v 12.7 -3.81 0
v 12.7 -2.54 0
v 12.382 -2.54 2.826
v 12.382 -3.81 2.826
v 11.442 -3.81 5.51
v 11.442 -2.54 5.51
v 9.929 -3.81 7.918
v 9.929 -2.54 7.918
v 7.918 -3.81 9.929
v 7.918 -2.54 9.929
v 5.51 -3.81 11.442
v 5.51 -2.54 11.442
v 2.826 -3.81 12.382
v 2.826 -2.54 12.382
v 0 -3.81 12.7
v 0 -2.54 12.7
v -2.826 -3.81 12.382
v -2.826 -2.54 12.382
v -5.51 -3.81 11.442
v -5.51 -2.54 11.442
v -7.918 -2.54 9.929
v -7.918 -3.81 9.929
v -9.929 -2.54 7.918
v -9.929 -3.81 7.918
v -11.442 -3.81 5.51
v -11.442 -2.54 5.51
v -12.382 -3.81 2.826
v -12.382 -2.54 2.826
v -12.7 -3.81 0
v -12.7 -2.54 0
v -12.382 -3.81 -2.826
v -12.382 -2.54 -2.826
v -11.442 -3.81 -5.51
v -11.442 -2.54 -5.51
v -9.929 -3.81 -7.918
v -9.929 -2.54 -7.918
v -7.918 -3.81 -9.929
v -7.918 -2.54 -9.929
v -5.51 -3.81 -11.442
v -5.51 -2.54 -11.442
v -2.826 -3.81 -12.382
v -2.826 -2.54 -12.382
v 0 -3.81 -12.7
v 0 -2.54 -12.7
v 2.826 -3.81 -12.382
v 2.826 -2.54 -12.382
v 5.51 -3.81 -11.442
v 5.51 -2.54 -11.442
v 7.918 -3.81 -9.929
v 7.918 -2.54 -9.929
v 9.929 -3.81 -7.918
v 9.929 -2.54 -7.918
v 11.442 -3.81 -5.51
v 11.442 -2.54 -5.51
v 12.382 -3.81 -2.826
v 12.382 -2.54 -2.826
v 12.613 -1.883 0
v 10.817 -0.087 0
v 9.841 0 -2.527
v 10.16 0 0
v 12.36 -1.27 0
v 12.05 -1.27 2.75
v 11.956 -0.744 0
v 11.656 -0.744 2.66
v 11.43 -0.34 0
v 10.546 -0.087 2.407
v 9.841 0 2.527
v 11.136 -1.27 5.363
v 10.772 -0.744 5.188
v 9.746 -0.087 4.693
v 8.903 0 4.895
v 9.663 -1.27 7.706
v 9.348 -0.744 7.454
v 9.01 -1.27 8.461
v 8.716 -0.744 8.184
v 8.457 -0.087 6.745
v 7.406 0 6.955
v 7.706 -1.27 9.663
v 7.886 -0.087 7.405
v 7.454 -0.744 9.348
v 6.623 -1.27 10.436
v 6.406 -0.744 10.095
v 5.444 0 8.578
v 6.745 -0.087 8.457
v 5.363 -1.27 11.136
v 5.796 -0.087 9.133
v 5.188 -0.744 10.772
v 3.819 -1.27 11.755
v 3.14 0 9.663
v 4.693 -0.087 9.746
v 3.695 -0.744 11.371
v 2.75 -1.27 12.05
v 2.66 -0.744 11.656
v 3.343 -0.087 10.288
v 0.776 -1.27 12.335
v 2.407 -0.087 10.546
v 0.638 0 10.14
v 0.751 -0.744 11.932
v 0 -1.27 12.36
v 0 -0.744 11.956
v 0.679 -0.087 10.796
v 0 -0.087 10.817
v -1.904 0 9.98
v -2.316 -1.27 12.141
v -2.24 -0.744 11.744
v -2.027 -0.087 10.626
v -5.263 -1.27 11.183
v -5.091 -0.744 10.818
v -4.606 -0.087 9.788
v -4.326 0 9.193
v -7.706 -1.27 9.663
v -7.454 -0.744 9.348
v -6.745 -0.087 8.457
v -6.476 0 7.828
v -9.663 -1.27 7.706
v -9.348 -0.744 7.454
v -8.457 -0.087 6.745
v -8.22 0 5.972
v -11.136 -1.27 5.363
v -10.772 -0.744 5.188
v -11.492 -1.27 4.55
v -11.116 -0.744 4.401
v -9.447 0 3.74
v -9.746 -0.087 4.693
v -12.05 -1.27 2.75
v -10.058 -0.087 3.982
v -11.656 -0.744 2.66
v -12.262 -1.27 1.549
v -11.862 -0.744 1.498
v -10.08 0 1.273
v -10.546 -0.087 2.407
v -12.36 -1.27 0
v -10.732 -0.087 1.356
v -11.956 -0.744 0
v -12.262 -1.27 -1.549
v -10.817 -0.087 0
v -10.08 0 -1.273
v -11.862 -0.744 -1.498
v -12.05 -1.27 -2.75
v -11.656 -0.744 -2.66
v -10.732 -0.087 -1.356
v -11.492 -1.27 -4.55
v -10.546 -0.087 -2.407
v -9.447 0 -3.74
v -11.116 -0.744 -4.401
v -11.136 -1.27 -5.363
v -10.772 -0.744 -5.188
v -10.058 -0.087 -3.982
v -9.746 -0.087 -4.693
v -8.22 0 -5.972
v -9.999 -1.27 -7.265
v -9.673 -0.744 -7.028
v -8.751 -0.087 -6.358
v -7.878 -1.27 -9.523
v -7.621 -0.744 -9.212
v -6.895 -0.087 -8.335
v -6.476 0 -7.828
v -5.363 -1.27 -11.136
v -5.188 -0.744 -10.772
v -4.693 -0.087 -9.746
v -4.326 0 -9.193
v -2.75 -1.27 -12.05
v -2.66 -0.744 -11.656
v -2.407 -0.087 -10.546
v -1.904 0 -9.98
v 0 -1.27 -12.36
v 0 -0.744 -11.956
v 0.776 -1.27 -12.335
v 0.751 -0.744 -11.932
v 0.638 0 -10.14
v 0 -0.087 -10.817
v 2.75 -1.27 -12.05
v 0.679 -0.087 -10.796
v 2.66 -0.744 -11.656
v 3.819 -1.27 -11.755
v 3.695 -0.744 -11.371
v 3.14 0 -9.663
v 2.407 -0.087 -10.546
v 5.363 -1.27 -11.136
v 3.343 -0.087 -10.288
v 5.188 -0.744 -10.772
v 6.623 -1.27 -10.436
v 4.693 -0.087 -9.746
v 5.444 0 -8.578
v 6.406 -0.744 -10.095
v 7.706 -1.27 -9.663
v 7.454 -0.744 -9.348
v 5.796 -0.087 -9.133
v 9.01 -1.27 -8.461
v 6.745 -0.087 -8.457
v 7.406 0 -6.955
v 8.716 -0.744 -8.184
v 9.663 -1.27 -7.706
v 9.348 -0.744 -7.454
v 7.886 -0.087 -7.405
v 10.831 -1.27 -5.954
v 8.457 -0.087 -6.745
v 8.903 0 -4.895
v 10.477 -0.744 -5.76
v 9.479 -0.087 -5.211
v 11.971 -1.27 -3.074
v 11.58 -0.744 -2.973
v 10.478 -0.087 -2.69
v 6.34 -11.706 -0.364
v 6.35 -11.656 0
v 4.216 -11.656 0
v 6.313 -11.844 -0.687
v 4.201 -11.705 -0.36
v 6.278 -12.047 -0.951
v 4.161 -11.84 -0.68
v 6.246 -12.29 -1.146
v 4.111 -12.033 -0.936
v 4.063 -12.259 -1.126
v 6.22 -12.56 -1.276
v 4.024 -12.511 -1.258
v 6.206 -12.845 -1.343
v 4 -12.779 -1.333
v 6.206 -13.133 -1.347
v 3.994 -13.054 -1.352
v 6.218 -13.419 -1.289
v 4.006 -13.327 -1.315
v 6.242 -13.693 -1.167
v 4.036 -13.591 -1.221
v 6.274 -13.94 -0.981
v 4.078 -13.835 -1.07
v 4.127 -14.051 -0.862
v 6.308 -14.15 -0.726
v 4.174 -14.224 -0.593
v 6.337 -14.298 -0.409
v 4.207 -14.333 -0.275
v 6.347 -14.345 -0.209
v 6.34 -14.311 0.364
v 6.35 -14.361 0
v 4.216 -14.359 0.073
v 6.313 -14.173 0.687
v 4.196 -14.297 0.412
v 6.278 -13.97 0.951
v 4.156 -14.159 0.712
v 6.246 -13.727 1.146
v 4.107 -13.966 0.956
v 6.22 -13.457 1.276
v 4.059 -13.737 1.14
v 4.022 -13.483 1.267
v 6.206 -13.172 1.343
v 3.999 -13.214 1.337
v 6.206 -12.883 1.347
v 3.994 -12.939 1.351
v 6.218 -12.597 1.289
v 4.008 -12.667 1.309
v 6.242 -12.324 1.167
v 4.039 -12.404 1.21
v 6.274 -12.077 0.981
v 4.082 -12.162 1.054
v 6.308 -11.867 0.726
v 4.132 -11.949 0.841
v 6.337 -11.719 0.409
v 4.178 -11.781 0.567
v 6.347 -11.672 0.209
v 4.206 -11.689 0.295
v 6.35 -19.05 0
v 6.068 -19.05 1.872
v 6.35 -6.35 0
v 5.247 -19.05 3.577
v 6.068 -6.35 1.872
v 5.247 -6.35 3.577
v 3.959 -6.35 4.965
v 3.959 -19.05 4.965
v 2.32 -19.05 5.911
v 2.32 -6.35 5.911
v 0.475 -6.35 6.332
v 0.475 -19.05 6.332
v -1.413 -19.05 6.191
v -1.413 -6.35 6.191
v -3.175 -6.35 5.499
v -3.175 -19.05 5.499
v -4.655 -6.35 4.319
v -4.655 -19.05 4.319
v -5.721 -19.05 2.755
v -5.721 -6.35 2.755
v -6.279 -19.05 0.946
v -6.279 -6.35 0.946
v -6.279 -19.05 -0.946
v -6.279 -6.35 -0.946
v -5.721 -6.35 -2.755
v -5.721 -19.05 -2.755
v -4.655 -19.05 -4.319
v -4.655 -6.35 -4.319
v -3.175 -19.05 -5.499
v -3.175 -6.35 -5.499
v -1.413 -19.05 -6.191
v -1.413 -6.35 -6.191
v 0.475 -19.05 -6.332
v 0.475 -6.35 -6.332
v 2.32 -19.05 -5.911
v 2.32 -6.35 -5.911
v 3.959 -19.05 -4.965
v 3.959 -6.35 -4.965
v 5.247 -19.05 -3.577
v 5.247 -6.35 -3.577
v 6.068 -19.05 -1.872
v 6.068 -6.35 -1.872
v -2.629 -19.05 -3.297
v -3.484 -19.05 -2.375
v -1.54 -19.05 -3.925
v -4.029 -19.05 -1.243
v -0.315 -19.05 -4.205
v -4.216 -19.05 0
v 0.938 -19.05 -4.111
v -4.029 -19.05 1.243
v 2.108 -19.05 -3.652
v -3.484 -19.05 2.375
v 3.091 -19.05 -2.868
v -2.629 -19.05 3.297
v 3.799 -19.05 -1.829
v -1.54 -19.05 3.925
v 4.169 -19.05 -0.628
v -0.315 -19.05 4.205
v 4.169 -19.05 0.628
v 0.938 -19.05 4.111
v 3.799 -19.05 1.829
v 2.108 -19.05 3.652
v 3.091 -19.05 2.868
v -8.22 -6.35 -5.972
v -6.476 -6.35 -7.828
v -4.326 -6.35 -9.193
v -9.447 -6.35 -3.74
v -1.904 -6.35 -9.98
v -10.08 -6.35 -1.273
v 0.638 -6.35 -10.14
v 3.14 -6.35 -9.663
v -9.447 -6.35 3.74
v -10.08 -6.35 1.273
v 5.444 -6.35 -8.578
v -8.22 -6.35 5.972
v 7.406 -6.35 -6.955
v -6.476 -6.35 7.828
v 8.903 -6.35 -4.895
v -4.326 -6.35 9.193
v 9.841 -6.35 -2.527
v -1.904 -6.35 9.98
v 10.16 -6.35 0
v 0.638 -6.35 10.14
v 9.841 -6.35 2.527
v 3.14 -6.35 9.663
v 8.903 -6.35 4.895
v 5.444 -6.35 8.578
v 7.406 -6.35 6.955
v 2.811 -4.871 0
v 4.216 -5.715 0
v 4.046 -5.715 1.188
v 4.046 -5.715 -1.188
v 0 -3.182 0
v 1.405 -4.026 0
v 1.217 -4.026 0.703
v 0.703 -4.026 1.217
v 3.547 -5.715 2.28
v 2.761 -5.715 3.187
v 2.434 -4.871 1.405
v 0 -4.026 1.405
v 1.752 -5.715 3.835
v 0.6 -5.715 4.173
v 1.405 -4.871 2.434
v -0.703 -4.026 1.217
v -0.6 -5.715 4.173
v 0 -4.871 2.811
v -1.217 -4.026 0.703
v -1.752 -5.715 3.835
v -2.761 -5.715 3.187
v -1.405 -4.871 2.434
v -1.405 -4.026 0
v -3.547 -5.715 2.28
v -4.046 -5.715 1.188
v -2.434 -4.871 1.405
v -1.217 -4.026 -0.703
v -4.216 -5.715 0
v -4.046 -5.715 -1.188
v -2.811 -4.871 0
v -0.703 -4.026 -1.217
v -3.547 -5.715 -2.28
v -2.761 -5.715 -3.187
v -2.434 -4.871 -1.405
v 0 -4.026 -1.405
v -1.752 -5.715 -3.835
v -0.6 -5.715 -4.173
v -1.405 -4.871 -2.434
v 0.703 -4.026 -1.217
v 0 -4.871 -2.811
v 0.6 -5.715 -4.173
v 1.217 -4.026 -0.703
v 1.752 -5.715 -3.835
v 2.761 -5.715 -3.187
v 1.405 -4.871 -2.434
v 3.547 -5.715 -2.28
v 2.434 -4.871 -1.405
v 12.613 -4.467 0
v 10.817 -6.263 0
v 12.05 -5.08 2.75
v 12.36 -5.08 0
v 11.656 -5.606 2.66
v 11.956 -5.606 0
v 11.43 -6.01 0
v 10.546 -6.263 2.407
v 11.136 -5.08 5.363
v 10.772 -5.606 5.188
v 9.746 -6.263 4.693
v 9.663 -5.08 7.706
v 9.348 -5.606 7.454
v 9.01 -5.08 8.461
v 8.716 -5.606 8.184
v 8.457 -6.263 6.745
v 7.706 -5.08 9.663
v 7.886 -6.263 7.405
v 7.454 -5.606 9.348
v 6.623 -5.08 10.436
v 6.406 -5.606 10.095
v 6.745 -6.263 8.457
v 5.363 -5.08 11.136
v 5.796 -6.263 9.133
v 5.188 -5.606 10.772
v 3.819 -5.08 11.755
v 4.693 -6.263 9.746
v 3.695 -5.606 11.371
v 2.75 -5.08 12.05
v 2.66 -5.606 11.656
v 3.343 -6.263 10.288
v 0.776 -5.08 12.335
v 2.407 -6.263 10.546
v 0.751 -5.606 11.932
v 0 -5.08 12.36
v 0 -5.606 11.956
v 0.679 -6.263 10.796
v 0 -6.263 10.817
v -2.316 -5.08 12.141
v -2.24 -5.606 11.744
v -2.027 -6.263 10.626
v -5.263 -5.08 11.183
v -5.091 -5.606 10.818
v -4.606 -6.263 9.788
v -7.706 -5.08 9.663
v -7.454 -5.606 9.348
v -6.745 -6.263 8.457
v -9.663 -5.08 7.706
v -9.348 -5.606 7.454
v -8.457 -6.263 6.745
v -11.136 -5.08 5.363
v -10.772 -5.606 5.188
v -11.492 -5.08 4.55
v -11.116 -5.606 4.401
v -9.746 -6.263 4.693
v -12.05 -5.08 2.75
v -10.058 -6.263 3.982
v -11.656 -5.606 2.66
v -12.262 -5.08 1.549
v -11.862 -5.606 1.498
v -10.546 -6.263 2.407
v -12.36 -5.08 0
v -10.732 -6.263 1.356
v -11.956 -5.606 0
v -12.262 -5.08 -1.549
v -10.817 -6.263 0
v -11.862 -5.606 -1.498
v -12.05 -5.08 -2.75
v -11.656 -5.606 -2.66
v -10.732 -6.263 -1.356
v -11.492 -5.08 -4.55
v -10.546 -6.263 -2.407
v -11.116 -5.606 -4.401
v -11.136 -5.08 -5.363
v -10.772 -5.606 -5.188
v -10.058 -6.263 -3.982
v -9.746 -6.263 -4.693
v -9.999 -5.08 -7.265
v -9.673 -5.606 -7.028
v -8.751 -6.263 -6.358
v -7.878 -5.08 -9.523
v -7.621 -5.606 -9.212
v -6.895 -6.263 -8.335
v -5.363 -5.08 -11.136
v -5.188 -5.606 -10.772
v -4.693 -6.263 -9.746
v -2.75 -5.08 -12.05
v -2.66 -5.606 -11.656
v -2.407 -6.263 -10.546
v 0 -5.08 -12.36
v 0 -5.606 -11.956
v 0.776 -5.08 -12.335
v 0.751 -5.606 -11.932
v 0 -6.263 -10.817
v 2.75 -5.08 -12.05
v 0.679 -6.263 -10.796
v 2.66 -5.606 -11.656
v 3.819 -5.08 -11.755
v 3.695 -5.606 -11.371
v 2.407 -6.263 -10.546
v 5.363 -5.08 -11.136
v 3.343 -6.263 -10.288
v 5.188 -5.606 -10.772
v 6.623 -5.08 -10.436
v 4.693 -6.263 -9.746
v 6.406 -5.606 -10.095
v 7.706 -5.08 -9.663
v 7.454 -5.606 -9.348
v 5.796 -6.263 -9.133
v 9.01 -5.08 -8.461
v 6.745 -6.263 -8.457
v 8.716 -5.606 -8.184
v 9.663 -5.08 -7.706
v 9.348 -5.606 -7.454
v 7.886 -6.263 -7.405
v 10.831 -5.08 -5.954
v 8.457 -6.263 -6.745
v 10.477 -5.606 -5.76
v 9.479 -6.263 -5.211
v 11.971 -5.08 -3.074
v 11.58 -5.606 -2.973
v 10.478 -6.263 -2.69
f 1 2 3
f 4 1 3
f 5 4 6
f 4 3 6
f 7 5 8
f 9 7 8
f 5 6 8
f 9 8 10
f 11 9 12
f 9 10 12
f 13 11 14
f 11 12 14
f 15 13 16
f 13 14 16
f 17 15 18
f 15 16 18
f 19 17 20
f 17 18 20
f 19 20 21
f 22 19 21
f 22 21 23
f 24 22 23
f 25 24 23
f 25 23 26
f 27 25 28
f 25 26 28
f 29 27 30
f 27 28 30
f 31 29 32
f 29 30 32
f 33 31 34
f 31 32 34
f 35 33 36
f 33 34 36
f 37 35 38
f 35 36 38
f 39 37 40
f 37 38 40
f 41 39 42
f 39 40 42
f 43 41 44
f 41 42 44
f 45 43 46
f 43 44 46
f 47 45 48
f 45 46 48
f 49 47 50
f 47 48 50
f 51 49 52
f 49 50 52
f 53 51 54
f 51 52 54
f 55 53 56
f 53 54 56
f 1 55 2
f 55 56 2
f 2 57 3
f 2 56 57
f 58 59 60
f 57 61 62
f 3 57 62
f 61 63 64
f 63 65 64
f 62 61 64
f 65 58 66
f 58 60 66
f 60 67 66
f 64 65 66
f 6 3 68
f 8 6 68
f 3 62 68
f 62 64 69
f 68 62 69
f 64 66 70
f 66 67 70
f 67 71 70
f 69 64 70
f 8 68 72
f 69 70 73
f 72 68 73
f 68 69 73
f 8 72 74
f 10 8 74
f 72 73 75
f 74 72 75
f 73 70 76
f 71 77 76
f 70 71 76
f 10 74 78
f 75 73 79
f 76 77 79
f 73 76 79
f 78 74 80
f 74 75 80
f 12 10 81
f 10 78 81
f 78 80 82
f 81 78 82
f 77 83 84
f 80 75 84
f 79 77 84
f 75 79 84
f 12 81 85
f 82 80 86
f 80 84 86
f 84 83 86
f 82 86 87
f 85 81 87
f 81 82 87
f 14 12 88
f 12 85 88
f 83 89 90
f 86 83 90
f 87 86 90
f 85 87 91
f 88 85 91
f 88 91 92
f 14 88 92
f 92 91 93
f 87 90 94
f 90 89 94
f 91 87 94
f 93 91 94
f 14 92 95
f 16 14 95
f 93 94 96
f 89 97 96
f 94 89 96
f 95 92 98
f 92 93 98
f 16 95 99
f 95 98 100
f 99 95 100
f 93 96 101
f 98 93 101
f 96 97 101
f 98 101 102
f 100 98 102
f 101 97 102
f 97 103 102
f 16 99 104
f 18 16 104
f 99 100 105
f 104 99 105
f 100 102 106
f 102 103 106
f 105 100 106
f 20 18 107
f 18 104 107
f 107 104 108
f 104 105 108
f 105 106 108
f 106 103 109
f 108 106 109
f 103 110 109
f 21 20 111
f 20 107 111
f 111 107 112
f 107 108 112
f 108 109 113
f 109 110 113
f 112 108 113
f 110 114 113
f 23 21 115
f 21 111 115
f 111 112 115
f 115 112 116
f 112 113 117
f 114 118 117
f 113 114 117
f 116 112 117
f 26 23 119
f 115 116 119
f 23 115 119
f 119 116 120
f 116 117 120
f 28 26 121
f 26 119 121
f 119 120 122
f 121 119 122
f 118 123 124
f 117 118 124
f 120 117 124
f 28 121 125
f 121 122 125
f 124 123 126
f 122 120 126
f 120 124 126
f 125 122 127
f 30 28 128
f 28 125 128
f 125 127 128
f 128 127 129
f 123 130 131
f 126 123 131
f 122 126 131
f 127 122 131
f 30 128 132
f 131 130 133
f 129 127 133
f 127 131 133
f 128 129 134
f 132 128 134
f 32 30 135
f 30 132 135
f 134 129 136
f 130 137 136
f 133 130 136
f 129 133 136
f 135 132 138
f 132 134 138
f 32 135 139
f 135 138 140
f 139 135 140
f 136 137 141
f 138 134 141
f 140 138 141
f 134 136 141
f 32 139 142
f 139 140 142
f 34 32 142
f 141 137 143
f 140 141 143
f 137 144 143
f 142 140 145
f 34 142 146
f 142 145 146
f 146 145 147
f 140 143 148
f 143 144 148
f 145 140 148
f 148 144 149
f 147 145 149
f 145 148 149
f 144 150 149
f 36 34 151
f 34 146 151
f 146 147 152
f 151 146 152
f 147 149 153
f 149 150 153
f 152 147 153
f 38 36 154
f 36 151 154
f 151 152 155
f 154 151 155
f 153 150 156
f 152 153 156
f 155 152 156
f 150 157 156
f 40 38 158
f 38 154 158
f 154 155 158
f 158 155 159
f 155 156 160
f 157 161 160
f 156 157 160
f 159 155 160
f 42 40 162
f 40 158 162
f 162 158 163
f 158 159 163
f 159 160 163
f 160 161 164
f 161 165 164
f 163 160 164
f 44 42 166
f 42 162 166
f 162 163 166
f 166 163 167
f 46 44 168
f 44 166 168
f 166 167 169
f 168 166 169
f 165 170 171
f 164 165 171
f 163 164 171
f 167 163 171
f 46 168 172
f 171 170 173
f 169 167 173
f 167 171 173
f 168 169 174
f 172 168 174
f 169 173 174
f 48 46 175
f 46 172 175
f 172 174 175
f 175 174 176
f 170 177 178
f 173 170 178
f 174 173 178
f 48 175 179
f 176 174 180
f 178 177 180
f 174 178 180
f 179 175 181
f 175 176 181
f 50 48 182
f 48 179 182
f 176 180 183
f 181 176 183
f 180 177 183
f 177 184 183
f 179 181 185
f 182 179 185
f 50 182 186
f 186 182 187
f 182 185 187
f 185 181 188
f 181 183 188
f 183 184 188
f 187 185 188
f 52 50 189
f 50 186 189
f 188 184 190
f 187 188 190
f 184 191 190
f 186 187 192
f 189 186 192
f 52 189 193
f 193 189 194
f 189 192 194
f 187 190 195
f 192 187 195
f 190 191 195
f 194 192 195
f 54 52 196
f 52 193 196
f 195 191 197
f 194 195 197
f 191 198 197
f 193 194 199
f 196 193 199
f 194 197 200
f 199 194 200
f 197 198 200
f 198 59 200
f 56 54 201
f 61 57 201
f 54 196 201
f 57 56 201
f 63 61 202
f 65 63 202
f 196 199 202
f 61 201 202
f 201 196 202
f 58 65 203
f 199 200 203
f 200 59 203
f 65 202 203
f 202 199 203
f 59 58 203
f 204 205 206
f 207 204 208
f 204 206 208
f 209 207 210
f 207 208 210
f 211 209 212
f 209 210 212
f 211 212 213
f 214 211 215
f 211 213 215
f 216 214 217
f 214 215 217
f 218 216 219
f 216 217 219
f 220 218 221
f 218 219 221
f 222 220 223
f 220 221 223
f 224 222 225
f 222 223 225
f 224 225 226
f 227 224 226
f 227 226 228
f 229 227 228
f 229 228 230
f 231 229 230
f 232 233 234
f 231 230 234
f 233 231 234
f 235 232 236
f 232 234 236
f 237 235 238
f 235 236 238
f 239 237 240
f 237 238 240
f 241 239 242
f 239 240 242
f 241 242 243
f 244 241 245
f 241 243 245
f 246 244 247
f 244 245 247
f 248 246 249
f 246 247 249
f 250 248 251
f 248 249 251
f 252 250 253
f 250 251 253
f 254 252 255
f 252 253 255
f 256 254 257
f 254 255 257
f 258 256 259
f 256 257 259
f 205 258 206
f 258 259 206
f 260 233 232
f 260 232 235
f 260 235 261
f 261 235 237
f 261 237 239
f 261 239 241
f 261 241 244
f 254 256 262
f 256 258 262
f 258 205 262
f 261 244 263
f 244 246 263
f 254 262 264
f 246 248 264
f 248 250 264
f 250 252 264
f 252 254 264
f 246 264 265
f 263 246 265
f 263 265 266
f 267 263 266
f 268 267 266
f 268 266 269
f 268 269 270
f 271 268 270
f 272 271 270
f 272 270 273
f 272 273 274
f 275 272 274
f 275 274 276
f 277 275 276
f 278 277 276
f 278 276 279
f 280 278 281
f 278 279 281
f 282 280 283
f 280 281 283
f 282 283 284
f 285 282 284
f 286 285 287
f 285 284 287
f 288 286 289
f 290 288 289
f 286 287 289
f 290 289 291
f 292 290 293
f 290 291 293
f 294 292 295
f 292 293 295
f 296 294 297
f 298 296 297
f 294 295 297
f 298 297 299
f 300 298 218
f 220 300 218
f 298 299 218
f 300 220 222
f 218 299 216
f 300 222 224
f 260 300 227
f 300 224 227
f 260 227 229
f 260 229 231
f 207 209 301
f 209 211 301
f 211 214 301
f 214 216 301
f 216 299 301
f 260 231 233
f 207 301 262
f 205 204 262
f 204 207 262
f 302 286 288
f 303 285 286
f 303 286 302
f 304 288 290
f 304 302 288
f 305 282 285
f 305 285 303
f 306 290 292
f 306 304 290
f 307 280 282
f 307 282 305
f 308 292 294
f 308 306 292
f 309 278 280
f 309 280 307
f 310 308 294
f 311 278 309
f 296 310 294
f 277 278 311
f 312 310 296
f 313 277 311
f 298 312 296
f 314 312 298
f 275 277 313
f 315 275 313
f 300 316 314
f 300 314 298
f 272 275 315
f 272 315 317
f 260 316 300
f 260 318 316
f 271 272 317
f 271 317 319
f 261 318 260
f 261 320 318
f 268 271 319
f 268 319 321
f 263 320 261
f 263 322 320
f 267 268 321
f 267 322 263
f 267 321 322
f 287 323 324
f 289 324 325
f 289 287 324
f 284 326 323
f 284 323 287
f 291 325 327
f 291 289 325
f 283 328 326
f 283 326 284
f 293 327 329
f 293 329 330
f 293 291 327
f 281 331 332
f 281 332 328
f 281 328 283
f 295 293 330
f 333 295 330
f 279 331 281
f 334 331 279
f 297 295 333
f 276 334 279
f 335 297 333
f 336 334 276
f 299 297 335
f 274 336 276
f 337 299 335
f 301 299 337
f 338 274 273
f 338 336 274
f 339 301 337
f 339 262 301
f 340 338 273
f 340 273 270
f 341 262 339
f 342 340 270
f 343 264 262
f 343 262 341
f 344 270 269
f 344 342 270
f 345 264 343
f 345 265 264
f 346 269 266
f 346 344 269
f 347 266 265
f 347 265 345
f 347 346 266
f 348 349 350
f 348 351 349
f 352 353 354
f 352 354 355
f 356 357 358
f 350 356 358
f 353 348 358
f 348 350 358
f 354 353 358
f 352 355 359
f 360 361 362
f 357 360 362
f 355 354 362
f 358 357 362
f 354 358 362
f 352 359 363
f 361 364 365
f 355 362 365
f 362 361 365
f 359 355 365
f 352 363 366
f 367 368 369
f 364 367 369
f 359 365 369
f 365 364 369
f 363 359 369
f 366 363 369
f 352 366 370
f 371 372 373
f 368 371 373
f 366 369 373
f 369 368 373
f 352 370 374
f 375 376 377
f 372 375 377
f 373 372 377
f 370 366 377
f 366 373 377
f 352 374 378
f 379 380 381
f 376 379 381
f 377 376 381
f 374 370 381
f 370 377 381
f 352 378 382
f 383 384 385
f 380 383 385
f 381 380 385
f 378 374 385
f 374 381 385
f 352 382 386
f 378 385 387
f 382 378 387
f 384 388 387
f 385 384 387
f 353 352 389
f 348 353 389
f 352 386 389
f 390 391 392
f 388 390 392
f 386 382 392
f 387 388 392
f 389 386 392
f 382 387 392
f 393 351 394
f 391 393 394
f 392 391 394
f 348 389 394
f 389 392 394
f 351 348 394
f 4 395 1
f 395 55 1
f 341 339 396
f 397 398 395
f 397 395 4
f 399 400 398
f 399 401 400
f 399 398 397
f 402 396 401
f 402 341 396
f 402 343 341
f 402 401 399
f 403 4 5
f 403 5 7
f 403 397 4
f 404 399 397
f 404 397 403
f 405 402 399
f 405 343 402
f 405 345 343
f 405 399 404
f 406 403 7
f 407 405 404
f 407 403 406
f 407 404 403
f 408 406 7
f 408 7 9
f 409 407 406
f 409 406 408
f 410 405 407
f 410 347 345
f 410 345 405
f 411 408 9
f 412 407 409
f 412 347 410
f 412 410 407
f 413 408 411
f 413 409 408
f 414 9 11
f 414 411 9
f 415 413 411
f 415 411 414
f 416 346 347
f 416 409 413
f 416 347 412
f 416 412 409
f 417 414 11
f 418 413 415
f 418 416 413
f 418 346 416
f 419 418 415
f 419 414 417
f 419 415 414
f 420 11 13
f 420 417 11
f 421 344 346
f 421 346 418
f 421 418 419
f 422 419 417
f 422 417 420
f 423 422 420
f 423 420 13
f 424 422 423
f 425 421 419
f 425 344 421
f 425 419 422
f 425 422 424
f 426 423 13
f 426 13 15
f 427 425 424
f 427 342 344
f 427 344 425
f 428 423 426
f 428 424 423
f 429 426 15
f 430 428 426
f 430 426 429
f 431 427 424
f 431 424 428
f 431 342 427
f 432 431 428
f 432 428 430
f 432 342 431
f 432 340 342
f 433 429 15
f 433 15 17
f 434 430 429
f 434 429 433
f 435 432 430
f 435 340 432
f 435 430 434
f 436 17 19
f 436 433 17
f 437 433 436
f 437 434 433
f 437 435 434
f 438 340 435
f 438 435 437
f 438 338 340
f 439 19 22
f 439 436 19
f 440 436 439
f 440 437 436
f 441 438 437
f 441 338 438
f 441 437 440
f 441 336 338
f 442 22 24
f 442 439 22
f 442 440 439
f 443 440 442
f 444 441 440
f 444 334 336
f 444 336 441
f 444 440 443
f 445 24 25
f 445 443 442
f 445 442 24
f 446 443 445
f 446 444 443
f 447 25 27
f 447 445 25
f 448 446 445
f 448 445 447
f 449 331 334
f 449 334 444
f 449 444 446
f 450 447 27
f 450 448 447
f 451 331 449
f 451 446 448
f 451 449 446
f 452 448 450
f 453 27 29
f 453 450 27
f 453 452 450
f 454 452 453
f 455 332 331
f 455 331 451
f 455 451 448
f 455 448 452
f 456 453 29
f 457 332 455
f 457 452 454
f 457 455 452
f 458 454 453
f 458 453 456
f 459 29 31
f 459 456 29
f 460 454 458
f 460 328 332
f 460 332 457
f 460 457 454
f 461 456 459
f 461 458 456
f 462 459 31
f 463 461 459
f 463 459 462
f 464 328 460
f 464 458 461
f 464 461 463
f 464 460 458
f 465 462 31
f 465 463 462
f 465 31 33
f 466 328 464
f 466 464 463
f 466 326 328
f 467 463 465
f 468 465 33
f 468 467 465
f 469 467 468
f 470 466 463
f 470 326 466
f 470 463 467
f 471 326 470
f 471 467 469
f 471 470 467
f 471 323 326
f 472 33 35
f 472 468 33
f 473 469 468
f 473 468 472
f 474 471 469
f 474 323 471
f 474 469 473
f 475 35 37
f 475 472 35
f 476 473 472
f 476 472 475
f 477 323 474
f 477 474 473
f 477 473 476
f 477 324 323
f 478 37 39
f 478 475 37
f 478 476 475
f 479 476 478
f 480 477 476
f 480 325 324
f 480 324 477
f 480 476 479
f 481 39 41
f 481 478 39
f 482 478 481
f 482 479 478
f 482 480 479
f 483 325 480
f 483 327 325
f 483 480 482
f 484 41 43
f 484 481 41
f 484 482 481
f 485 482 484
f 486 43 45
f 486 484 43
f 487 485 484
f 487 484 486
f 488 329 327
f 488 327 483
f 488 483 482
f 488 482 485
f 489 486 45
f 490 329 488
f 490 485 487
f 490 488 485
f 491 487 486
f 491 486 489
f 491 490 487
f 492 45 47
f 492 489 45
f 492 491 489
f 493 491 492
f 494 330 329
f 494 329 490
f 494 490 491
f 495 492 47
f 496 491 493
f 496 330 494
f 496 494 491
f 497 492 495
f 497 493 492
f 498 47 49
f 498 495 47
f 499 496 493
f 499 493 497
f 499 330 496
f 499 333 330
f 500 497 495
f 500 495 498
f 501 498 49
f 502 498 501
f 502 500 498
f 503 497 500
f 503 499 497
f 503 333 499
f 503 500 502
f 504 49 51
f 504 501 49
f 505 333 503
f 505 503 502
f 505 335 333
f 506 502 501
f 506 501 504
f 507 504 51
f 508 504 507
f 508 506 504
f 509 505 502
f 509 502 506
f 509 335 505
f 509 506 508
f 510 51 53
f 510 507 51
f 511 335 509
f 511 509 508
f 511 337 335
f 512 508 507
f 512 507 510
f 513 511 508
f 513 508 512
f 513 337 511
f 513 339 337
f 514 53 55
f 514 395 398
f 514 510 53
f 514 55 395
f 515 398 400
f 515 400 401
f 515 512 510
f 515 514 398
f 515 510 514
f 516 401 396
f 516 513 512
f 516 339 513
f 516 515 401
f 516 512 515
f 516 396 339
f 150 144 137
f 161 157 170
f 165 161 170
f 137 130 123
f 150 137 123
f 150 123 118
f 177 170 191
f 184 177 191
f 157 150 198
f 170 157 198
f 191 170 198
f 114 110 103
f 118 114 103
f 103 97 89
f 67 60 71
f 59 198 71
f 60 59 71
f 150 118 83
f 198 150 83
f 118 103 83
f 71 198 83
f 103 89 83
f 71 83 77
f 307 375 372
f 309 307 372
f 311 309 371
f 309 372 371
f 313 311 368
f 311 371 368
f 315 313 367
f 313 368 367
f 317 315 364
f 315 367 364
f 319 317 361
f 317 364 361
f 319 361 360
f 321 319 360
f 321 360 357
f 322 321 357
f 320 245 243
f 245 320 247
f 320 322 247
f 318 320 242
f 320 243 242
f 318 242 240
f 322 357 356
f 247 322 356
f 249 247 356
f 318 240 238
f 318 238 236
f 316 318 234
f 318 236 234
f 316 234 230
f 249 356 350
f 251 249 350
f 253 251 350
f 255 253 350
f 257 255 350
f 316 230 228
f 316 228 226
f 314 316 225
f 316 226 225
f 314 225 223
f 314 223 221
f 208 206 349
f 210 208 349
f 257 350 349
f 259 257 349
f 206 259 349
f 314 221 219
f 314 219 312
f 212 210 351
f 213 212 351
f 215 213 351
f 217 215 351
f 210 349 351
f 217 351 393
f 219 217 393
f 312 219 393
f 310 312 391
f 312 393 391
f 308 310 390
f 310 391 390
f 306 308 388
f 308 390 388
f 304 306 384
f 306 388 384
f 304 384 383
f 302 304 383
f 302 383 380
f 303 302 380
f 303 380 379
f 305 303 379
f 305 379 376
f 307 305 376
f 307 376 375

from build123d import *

# Parameters (mm, degrees)
F0_R     = 6.35
F1_DEPTH = 19.05
F0_R_2   = 12.7
F2_DEPTH = 6.35
F4_D     = 8.4328
F4_DEPTH = 13.335
F4_TIP   = 2.5334687141
F6_R     = 2.54
F7_D     = 2.7051
F7_DEPTH = 7.62
F7_TIP   = 0.8126940303


with BuildPart() as f1:
    # F0 (on Front) → F1 (new body)
    with BuildSketch(Plane.XZ):
        Circle(F0_R)
    extrude(amount=F1_DEPTH)

    # F0 (on Front) → F2 (join)
    with BuildSketch(Plane.XZ):
        Circle(F0_R_2)
        Circle(F0_R, mode=Mode.SUBTRACT)
    extrude(amount=F2_DEPTH)

    # F4
    with Locations(Plane.XZ.offset(19.05)):
        with Locations((0, 0)):
            Hole(F4_D / 2, depth=F4_DEPTH)
            with Locations((0, 0, -(F4_DEPTH + F4_TIP / 2))):  # 118° drill point
                Cone(0, F4_D / 2, F4_TIP, mode=Mode.SUBTRACT)

    # F6
    f6_edges = [f1.edges().sort_by_distance(p)[0] for p in [
        (-12.7, -6.35, 0),
        (-12.7, 0, 0),
    ]]
    fillet(f6_edges, radius=F6_R)

    # F7 (one way)
    with BuildSketch(Plane(origin=(0, 0, 0), x_dir=(0, 1, 0), z_dir=(-1, 0, 0))):
        with Locations((-13.0086187273, 0)):
            Circle(F7_D / 2)
    extrude(amount=-F7_DEPTH, mode=Mode.SUBTRACT)
    with Locations(Plane(origin=(0, 0, 0), x_dir=(0, 1, 0), z_dir=(-1, 0, 0))):
        with Locations((-13.0086187273, 0)):
            with Locations((0, 0, -(F7_DEPTH + F7_TIP / 2))):  # 118° drill point
                Cone(0, F7_D / 2, F7_TIP, mode=Mode.SUBTRACT)


solid = f1.part
